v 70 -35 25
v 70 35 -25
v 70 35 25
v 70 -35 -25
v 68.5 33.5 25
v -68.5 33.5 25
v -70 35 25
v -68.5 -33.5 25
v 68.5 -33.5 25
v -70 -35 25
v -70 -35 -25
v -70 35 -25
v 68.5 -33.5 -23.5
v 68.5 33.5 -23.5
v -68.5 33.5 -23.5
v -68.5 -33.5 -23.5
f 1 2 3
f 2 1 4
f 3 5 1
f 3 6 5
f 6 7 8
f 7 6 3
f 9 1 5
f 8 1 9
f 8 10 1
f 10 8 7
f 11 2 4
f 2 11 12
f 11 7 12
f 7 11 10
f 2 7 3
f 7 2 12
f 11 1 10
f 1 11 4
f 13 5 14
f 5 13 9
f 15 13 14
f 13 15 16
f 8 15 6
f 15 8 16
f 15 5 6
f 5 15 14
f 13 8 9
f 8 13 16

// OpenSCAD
// ========================================
// a 140 x 70 x 50 mm enclosure with 1.5 mm wall thickness
// NeuroCAD canonical IR; dimensions are millimetres
// ========================================
$fn = 48;

difference() {
  cube(size=[140, 70, 50], center=true);
  translate([0, 0, 0.85]) {
    cube(size=[137, 67, 48.7], center=true);
  }
}
